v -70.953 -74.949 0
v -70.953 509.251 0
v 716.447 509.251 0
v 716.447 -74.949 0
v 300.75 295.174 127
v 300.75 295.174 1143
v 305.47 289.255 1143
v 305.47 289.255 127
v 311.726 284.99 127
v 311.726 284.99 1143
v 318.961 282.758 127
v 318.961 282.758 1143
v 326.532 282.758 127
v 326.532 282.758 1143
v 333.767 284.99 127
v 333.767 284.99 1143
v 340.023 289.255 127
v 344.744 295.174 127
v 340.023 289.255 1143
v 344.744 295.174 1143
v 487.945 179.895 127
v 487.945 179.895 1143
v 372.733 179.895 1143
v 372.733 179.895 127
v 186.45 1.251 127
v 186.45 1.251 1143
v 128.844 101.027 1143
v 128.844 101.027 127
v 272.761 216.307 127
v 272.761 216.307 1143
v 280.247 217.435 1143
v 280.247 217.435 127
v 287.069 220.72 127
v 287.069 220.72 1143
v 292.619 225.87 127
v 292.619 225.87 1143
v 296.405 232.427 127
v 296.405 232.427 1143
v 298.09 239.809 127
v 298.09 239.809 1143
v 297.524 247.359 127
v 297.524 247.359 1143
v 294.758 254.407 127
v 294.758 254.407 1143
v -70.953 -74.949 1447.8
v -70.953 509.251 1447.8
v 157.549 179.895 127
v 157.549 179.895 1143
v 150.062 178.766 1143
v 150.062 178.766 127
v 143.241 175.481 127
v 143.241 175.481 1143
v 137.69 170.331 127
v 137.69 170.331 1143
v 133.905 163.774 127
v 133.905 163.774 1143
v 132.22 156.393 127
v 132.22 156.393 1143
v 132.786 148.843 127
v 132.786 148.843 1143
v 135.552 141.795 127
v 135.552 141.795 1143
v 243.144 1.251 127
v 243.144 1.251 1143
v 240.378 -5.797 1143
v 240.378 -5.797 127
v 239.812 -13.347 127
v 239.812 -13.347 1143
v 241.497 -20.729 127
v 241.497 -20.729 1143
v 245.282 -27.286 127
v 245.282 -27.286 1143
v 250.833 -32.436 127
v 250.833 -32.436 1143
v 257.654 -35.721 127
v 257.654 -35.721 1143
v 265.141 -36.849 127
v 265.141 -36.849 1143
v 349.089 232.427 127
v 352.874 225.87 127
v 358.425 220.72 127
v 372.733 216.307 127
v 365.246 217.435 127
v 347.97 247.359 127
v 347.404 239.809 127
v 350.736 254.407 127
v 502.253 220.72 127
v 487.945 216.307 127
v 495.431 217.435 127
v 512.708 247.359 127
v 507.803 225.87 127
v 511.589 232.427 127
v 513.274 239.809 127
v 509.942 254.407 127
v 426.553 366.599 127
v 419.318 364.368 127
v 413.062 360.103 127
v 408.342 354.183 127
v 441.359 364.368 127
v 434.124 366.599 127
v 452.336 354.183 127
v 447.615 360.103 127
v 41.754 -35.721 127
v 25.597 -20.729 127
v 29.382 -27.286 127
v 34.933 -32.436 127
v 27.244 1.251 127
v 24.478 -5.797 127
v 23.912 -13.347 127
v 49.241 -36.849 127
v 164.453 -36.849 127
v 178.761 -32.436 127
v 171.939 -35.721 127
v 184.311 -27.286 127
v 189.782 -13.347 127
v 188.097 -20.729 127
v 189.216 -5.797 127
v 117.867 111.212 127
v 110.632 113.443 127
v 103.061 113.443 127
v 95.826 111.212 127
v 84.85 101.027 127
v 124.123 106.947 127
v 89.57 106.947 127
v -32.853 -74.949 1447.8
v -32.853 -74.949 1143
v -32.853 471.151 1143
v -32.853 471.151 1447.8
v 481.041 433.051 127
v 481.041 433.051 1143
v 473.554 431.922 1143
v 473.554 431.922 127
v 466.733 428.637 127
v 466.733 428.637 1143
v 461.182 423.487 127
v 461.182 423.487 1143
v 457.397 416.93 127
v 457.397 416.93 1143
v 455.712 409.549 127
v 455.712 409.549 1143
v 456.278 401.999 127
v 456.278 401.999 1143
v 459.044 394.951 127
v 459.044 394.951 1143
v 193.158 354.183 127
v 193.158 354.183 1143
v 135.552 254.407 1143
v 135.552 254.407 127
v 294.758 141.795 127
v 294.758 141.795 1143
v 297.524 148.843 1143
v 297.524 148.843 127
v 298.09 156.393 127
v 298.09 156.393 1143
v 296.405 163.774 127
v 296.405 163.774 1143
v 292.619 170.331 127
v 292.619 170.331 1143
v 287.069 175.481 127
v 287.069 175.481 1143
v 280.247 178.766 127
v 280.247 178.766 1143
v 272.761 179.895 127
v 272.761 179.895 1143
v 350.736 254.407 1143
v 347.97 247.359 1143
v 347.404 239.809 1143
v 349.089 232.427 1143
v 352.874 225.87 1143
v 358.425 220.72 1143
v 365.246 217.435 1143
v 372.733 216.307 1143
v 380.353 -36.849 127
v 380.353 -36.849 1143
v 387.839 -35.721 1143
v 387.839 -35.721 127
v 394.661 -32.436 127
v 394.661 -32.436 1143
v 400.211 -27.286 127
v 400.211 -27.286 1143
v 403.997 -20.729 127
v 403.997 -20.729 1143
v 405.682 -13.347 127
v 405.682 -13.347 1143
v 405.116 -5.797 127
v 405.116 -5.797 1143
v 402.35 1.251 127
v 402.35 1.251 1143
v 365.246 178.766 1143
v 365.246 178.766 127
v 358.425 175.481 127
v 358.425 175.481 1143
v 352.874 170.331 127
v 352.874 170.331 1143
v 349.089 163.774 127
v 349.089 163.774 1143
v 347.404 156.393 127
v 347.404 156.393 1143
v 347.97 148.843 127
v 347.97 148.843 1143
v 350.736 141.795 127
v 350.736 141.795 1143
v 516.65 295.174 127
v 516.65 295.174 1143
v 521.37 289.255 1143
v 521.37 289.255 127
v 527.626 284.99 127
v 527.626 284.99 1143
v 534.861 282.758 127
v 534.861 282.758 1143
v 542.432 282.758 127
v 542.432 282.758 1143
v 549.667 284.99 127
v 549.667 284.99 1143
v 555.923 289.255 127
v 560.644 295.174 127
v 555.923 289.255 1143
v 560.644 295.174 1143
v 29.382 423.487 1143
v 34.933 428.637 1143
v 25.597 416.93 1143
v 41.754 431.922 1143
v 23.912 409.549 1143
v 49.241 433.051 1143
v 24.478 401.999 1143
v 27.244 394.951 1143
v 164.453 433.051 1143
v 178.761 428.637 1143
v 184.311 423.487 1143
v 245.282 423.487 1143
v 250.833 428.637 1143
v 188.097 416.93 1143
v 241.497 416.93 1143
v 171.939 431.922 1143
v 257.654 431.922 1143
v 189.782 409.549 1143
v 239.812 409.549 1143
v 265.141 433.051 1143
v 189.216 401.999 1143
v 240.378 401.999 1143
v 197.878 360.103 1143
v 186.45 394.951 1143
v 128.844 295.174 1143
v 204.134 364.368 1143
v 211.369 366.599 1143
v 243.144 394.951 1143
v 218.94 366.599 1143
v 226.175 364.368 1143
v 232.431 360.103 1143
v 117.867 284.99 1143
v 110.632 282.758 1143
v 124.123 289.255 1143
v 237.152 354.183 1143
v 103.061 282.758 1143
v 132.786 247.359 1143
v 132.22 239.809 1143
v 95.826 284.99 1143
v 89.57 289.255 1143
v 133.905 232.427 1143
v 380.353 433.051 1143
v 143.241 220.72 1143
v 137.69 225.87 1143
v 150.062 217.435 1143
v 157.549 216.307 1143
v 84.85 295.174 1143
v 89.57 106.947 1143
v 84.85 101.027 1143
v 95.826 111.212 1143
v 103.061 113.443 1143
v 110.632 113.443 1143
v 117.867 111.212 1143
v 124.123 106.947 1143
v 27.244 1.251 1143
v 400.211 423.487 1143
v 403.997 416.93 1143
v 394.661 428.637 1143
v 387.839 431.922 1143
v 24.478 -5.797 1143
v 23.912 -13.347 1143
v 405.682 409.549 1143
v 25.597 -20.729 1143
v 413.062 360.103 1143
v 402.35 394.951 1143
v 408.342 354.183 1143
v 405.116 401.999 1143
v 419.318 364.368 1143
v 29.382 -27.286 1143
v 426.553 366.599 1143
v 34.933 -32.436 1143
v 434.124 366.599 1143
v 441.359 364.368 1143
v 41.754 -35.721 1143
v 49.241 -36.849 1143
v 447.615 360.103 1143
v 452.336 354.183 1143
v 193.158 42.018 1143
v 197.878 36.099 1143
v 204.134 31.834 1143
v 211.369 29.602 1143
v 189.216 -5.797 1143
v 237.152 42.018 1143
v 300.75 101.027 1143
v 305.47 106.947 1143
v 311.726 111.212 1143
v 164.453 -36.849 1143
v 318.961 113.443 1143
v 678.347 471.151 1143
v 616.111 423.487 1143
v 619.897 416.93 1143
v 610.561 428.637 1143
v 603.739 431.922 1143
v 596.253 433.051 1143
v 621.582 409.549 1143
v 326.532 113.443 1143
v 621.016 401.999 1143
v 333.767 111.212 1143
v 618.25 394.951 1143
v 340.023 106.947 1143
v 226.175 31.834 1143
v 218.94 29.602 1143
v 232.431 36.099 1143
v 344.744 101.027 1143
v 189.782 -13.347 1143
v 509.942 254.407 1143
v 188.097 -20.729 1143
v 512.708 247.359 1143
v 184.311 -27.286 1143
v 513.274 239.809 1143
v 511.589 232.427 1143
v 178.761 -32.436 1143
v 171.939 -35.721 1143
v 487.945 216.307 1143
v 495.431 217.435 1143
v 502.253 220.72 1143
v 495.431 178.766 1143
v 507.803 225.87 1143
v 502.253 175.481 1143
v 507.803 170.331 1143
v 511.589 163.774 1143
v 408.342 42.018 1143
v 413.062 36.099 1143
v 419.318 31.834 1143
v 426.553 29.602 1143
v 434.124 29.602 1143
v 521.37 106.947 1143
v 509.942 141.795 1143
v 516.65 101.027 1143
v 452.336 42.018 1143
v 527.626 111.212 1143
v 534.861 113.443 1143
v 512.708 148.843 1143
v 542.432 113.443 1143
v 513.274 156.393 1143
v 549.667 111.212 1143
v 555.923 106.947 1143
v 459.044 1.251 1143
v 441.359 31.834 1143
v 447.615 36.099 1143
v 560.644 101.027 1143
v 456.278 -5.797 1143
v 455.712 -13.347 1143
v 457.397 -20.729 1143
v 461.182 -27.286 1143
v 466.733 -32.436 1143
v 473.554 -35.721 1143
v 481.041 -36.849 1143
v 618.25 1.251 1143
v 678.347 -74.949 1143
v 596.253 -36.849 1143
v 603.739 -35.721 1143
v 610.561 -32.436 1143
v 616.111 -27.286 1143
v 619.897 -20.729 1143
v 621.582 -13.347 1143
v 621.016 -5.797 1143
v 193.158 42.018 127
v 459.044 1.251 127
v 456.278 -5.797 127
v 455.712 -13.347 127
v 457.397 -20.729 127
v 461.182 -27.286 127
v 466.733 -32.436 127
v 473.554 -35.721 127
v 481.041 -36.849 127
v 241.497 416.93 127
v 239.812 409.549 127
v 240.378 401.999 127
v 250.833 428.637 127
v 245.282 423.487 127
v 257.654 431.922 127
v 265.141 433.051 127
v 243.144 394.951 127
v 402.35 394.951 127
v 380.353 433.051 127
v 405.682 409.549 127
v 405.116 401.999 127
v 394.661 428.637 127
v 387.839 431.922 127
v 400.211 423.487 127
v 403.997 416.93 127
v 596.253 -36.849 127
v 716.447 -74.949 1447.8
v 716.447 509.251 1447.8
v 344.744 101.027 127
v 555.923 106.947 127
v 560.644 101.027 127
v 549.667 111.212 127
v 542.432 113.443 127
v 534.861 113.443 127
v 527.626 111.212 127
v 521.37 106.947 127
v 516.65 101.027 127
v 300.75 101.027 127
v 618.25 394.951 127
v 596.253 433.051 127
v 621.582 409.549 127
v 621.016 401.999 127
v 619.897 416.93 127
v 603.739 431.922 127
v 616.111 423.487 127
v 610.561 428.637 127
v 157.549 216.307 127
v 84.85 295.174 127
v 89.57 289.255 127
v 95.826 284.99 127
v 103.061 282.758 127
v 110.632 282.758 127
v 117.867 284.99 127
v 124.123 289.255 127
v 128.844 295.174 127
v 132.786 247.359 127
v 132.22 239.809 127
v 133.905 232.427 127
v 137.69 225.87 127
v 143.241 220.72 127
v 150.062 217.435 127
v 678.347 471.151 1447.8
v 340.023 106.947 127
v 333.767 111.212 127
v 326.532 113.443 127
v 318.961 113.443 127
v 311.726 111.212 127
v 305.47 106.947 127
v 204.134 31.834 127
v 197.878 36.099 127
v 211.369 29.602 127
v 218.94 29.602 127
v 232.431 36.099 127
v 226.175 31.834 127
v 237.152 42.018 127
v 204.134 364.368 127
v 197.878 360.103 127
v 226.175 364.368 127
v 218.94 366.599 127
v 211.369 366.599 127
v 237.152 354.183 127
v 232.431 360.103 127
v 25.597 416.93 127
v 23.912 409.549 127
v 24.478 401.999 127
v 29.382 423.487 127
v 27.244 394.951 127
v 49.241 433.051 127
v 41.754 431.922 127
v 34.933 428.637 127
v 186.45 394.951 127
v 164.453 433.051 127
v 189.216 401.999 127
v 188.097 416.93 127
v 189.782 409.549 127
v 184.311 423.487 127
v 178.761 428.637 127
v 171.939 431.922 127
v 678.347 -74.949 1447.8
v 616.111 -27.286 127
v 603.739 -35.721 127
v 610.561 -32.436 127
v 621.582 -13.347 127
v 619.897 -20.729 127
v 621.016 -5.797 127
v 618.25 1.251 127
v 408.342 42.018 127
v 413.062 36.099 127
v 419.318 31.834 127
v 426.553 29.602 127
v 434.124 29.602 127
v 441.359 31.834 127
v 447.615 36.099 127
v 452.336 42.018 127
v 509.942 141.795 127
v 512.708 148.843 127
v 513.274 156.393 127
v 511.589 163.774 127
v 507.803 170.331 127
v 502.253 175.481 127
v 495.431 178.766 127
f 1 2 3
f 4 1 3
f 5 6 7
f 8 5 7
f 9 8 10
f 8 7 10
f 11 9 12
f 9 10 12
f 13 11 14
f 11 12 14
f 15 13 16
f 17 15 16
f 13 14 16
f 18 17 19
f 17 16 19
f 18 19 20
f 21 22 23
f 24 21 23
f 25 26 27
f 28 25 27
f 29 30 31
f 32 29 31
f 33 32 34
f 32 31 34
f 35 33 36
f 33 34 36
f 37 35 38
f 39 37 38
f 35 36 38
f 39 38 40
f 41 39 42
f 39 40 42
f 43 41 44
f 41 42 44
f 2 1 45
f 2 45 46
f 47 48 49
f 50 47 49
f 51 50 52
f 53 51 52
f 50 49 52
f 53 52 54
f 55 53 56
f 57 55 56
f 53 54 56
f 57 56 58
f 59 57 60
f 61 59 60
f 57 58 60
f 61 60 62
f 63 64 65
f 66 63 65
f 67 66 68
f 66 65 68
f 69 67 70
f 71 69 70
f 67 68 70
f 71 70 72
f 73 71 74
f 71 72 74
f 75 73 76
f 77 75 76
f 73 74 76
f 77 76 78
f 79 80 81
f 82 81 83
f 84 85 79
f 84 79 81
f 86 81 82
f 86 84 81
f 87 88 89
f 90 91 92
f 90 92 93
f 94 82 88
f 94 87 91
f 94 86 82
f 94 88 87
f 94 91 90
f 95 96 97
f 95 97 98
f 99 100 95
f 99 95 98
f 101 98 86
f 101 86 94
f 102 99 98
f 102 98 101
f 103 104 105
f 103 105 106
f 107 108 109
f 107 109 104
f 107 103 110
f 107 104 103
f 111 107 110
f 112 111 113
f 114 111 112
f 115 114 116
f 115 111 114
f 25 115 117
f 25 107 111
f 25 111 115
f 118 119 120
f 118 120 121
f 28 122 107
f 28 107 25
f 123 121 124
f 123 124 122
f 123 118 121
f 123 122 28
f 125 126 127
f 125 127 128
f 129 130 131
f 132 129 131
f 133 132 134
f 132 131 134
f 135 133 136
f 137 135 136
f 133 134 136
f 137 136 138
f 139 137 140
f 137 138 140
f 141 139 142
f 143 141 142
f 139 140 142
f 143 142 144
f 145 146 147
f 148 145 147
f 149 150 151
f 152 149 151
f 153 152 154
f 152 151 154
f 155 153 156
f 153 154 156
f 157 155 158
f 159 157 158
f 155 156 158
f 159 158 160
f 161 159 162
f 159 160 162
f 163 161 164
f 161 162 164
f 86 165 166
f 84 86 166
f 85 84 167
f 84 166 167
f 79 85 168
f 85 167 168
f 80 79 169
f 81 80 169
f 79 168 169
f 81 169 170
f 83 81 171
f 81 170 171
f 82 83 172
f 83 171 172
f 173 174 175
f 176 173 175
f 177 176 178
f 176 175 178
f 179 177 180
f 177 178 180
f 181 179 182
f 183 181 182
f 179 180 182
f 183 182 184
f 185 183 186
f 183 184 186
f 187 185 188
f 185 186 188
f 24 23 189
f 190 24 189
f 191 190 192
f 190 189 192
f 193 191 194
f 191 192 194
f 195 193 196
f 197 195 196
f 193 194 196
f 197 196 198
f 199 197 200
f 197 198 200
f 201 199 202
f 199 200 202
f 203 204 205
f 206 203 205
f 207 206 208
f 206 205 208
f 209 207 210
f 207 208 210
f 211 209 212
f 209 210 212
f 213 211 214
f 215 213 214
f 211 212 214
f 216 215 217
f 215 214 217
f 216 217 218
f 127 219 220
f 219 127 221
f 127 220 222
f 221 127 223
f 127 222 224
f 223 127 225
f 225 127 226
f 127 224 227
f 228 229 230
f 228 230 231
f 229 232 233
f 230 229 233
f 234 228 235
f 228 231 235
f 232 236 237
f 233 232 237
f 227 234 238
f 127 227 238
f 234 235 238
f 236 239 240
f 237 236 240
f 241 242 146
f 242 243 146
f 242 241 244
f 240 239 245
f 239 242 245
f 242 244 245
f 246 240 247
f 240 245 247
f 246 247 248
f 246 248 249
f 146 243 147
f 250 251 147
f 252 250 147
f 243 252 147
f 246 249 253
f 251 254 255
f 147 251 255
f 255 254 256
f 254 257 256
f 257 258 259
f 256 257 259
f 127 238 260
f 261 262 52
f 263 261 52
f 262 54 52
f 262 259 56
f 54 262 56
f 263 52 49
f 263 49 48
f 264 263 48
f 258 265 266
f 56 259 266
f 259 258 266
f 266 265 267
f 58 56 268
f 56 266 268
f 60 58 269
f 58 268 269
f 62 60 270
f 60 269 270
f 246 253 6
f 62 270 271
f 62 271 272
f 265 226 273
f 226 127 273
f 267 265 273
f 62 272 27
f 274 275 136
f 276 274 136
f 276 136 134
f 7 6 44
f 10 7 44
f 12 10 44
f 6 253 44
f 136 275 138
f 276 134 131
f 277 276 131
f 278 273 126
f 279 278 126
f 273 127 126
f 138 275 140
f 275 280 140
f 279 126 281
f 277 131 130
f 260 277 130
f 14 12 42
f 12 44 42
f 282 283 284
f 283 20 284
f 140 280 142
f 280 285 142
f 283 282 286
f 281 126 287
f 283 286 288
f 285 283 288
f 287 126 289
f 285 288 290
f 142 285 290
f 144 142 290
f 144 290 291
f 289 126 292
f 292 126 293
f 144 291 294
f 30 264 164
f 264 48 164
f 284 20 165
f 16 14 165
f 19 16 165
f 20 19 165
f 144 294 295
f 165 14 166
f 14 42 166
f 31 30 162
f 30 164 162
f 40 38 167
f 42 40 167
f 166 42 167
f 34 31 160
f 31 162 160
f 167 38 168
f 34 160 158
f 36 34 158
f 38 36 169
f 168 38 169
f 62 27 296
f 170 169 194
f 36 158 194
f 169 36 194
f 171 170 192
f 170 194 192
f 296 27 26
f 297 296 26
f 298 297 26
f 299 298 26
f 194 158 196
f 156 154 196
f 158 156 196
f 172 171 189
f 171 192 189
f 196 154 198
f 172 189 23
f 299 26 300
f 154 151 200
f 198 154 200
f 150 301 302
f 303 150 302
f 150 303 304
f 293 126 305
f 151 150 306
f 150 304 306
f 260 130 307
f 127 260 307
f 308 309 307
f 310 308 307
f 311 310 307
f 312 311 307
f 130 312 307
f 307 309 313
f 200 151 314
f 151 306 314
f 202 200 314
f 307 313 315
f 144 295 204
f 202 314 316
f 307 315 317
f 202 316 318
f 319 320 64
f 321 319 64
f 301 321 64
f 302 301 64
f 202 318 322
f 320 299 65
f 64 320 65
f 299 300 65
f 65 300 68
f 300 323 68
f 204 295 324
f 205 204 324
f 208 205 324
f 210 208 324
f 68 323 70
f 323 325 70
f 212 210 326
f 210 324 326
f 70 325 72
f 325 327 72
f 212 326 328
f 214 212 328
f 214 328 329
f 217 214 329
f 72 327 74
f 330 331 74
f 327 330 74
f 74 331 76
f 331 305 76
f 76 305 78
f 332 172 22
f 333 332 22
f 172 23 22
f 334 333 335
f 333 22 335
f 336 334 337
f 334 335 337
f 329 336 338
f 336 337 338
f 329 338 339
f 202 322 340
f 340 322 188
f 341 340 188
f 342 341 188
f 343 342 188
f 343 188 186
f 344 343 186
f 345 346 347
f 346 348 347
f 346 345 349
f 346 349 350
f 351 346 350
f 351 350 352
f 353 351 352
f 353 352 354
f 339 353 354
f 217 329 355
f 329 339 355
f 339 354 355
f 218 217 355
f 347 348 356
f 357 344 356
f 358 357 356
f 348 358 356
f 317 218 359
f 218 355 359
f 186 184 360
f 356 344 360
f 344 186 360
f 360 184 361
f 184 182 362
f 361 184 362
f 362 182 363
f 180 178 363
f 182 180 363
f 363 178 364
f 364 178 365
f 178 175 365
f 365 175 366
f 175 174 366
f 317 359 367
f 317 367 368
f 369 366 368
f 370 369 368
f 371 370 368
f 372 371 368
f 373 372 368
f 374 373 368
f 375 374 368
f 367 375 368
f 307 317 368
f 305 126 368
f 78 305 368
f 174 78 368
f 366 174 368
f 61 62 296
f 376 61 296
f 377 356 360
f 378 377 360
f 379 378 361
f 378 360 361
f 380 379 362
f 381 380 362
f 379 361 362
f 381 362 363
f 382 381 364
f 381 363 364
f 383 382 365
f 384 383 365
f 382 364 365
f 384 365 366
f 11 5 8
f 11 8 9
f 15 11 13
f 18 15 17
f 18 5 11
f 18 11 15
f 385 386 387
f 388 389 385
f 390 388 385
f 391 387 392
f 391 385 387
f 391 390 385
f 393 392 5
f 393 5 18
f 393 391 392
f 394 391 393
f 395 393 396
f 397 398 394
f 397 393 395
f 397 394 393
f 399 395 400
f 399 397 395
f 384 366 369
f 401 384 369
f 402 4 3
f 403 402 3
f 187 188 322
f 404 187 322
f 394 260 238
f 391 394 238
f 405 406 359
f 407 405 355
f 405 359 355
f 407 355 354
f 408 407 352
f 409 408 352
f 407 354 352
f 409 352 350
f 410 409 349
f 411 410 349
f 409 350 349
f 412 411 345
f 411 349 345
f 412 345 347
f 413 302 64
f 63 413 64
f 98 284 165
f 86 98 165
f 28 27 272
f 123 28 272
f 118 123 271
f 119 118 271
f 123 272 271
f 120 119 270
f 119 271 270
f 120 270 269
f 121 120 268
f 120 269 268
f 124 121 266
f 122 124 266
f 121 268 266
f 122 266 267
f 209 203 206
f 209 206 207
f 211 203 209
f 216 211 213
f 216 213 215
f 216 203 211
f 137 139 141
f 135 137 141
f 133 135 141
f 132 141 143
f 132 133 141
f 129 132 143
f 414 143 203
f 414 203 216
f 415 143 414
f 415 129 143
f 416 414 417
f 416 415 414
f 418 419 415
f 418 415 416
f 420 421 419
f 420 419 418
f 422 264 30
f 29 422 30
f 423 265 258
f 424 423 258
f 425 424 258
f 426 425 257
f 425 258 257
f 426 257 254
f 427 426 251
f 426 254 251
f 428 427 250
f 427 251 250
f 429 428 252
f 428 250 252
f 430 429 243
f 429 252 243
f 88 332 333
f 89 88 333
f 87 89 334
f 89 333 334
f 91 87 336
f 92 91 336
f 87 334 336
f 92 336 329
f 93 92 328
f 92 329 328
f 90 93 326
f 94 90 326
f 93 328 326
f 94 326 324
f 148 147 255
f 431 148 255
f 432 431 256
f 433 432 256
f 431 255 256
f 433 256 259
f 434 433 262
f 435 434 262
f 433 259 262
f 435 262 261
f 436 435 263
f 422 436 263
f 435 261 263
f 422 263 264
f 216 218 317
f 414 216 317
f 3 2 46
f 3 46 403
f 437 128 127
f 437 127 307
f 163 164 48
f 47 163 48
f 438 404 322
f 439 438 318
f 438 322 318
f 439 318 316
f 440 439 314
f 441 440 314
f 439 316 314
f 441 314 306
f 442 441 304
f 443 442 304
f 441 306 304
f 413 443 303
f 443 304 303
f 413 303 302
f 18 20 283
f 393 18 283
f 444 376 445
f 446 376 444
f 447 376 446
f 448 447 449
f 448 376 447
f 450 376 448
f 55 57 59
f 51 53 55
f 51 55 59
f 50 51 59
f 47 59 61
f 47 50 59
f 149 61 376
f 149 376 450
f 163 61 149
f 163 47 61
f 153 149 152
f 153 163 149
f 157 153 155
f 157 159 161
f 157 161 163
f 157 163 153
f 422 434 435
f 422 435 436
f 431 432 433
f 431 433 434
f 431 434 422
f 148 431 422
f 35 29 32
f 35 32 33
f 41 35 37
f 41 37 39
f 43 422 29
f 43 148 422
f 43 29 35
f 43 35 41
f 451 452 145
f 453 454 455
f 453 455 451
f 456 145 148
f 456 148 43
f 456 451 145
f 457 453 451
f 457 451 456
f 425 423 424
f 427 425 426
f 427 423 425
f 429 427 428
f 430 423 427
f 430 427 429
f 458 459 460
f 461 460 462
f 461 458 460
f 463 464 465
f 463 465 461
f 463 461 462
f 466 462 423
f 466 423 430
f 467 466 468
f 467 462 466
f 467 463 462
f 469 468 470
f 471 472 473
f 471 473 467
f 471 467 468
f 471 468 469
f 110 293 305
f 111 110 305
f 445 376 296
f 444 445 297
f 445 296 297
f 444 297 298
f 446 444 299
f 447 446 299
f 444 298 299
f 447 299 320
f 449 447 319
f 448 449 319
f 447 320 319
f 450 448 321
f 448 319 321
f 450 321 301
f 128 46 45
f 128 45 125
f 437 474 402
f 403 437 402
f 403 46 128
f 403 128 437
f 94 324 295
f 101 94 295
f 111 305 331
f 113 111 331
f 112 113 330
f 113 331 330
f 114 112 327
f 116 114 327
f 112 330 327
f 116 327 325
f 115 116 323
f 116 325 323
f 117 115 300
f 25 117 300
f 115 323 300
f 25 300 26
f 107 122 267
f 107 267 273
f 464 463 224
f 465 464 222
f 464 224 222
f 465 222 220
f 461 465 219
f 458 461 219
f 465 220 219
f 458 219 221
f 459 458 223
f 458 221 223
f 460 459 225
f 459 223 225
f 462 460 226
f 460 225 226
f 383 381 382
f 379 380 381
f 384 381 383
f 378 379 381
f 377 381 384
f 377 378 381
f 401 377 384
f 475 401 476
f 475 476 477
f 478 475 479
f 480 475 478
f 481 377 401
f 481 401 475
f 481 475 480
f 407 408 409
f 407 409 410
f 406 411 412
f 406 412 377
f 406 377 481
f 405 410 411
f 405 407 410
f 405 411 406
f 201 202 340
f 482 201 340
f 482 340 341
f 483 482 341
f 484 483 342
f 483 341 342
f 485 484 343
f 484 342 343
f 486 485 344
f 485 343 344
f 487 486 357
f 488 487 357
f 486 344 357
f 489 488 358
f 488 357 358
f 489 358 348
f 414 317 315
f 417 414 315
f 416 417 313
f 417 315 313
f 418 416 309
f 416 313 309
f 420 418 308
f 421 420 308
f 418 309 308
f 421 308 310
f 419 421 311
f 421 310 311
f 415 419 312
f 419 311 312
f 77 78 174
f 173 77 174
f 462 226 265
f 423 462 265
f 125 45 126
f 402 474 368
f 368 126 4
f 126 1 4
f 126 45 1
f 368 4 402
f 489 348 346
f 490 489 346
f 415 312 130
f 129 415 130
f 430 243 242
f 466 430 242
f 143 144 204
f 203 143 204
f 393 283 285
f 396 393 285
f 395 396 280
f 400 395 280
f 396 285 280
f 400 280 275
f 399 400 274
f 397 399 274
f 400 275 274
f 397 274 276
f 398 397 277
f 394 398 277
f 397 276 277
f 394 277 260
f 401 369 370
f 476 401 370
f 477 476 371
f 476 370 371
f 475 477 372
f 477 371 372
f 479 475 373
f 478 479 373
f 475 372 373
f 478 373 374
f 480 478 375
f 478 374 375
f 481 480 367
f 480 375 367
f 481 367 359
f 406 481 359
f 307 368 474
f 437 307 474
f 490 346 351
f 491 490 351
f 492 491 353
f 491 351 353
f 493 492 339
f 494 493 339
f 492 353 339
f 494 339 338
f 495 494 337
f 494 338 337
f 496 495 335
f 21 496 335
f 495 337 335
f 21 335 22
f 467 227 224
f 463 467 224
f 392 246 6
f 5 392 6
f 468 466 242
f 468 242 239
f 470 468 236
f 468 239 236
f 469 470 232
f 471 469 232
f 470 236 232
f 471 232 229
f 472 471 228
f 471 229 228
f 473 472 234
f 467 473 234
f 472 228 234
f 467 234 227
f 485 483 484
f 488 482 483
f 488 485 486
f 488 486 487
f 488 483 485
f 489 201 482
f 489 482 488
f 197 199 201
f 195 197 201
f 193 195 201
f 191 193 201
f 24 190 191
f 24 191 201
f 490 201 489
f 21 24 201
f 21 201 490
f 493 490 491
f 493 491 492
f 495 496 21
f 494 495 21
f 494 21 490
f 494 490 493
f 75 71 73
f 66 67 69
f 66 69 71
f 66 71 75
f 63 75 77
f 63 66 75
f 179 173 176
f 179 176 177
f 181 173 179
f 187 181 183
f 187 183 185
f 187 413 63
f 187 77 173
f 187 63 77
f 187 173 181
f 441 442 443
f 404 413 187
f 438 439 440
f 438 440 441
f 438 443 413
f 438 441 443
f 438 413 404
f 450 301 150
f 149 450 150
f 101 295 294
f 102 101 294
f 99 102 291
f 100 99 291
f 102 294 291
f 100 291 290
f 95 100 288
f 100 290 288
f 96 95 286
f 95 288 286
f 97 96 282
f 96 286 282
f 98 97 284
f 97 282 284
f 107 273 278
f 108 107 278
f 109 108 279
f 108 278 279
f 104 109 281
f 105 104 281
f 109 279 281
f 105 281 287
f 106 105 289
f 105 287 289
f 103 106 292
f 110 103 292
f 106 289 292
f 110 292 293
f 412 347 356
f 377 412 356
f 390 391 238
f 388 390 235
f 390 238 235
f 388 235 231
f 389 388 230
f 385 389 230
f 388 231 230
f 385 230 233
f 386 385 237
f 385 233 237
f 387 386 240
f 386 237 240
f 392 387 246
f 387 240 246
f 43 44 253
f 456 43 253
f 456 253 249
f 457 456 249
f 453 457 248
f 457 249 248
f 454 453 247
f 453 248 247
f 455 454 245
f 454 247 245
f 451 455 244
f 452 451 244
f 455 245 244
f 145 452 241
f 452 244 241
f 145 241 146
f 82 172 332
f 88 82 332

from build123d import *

# Parameters (mm, degrees)
F0_W     = 787.4
F0_H     = 584.2
F1_DEPTH = 1447.8
F2_W     = 711.2
F2_H     = 304.8
F3_DEPTH = 546.1
F5_DEPTH = 1016


with BuildPart() as f1:
    # F0 (on Top) → F1 (new body)
    with BuildSketch(Plane.XY):
        with Locations((322.746758, 217.150773)):
            Rectangle(F0_W, F0_H)
    extrude(amount=F1_DEPTH)

    # F2 (on face) → F3 (cut)
    with BuildSketch(Plane.XZ.offset(74.949227)):
        with Locations((322.746758, 1295.4)):
            Rectangle(F2_W, F2_H)
    extrude(amount=-F3_DEPTH, mode=Mode.SUBTRACT)

    # F4 (on face) → F5 (cut)
    with BuildSketch(Plane.XY.offset(1143)):
        with BuildLine():
            ThreePointArc((27.243803, 1.250773), (27.243803, -24.149227), (49.240848, -36.849227))
            Line((49.240848, -36.849227), (164.452667, -36.849227))
            ThreePointArc((164.452667, -36.849227), (186.449712, -24.149227), (186.449712, 1.250773))
            Line((186.449712, 1.250773), (128.843803, 101.027135))
            ThreePointArc((128.843803, 101.027135), (106.846758, 113.727135), (84.849712, 101.027135))
            Line((84.849712, 101.027135), (27.243803, 1.250773))
        make_face()
        with BuildLine():
            ThreePointArc((380.352667, -36.849227), (402.349712, -24.149227), (402.349712, 1.250773))
            Line((402.349712, 1.250773), (344.743803, 101.027135))
            ThreePointArc((344.743803, 101.027135), (322.746758, 113.727135), (300.749712, 101.027135))
            Line((300.749712, 101.027135), (243.143803, 1.250773))
            ThreePointArc((243.143803, 1.250773), (243.143803, -24.149227), (265.140848, -36.849227))
            Line((265.140848, -36.849227), (380.352667, -36.849227))
        make_face()
        with BuildLine():
            ThreePointArc((596.252667, -36.849227), (618.249712, -24.149227), (618.249712, 1.250773))
            Line((618.249712, 1.250773), (560.643803, 101.027135))
            ThreePointArc((560.643803, 101.027135), (538.646758, 113.727135), (516.649712, 101.027135))
            Line((516.649712, 101.027135), (459.043803, 1.250773))
            ThreePointArc((459.043803, 1.250773), (459.043803, -24.149227), (481.040848, -36.849227))
            Line((481.040848, -36.849227), (596.252667, -36.849227))
        make_face()
        with BuildLine():
            Line((272.760662, 179.894812), (157.548843, 179.894812))
            ThreePointArc((157.548843, 179.894812), (135.551798, 167.194812), (135.551798, 141.794812))
            Line((135.551798, 141.794812), (193.157707, 42.01845))
            ThreePointArc((193.157707, 42.01845), (215.154753, 29.31845), (237.151798, 42.01845))
            Line((237.151798, 42.01845), (294.757707, 141.794812))
            ThreePointArc((294.757707, 141.794812), (294.757707, 167.194812), (272.760662, 179.894812))
        make_face()
        with BuildLine():
            ThreePointArc((509.941717, 141.794812), (509.941717, 167.194812), (487.944672, 179.894812))
            Line((487.944672, 179.894812), (372.732853, 179.894812))
            ThreePointArc((372.732853, 179.894812), (350.735808, 167.194812), (350.735808, 141.794812))
            Line((350.735808, 141.794812), (408.341717, 42.01845))
            ThreePointArc((408.341717, 42.01845), (430.338762, 29.31845), (452.335808, 42.01845))
            Line((452.335808, 42.01845), (509.941717, 141.794812))
        make_face()
        with BuildLine():
            Line((164.452667, 433.050773), (49.240848, 433.050773))
            ThreePointArc((49.240848, 433.050773), (27.243803, 420.350773), (27.243803, 394.950773))
            Line((27.243803, 394.950773), (84.849712, 295.174411))
            ThreePointArc((84.849712, 295.174411), (106.846758, 282.474411), (128.843803, 295.174411))
            Line((128.843803, 295.174411), (186.449712, 394.950773))
            ThreePointArc((186.449712, 394.950773), (186.449712, 420.350773), (164.452667, 433.050773))
        make_face()
        with BuildLine():
            Line((560.643803, 295.174411), (618.249712, 394.950773))
            ThreePointArc((618.249712, 394.950773), (618.249712, 420.350773), (596.252667, 433.050773))
            Line((596.252667, 433.050773), (481.040848, 433.050773))
            ThreePointArc((481.040848, 433.050773), (459.043803, 420.350773), (459.043803, 394.950773))
            Line((459.043803, 394.950773), (516.649712, 295.174411))
            ThreePointArc((516.649712, 295.174411), (538.646758, 282.474411), (560.643803, 295.174411))
        make_face()
        with BuildLine():
            ThreePointArc((237.151798, 354.183096), (215.154753, 366.883096), (193.157707, 354.183096))
            Line((193.157707, 354.183096), (135.551798, 254.406734))
            ThreePointArc((135.551798, 254.406734), (135.551798, 229.006734), (157.548843, 216.306734))
            Line((157.548843, 216.306734), (272.760662, 216.306734))
            ThreePointArc((272.760662, 216.306734), (294.757707, 229.006734), (294.757707, 254.406734))
            Line((294.757707, 254.406734), (237.151798, 354.183096))
        make_face()
        with BuildLine():
            Line((408.341717, 354.183096), (350.735808, 254.406734))
            ThreePointArc((350.735808, 254.406734), (350.735808, 229.006734), (372.732853, 216.306734))
            Line((372.732853, 216.306734), (487.944672, 216.306734))
            ThreePointArc((487.944672, 216.306734), (509.941717, 229.006734), (509.941717, 254.406734))
            Line((509.941717, 254.406734), (452.335808, 354.183096))
            ThreePointArc((452.335808, 354.183096), (430.338762, 366.883096), (408.341717, 354.183096))
        make_face()
        with BuildLine():
            ThreePointArc((265.140848, 433.050773), (243.143803, 420.350773), (243.143803, 394.950773))
            Line((243.143803, 394.950773), (300.749712, 295.174411))
            ThreePointArc((300.749712, 295.174411), (322.746758, 282.474411), (344.743803, 295.174411))
            Line((344.743803, 295.174411), (402.349712, 394.950773))
            ThreePointArc((402.349712, 394.950773), (402.349712, 420.350773), (380.352667, 433.050773))
            Line((380.352667, 433.050773), (265.140848, 433.050773))
        make_face()
    extrude(amount=-F5_DEPTH, mode=Mode.SUBTRACT)


solid = f1.part
